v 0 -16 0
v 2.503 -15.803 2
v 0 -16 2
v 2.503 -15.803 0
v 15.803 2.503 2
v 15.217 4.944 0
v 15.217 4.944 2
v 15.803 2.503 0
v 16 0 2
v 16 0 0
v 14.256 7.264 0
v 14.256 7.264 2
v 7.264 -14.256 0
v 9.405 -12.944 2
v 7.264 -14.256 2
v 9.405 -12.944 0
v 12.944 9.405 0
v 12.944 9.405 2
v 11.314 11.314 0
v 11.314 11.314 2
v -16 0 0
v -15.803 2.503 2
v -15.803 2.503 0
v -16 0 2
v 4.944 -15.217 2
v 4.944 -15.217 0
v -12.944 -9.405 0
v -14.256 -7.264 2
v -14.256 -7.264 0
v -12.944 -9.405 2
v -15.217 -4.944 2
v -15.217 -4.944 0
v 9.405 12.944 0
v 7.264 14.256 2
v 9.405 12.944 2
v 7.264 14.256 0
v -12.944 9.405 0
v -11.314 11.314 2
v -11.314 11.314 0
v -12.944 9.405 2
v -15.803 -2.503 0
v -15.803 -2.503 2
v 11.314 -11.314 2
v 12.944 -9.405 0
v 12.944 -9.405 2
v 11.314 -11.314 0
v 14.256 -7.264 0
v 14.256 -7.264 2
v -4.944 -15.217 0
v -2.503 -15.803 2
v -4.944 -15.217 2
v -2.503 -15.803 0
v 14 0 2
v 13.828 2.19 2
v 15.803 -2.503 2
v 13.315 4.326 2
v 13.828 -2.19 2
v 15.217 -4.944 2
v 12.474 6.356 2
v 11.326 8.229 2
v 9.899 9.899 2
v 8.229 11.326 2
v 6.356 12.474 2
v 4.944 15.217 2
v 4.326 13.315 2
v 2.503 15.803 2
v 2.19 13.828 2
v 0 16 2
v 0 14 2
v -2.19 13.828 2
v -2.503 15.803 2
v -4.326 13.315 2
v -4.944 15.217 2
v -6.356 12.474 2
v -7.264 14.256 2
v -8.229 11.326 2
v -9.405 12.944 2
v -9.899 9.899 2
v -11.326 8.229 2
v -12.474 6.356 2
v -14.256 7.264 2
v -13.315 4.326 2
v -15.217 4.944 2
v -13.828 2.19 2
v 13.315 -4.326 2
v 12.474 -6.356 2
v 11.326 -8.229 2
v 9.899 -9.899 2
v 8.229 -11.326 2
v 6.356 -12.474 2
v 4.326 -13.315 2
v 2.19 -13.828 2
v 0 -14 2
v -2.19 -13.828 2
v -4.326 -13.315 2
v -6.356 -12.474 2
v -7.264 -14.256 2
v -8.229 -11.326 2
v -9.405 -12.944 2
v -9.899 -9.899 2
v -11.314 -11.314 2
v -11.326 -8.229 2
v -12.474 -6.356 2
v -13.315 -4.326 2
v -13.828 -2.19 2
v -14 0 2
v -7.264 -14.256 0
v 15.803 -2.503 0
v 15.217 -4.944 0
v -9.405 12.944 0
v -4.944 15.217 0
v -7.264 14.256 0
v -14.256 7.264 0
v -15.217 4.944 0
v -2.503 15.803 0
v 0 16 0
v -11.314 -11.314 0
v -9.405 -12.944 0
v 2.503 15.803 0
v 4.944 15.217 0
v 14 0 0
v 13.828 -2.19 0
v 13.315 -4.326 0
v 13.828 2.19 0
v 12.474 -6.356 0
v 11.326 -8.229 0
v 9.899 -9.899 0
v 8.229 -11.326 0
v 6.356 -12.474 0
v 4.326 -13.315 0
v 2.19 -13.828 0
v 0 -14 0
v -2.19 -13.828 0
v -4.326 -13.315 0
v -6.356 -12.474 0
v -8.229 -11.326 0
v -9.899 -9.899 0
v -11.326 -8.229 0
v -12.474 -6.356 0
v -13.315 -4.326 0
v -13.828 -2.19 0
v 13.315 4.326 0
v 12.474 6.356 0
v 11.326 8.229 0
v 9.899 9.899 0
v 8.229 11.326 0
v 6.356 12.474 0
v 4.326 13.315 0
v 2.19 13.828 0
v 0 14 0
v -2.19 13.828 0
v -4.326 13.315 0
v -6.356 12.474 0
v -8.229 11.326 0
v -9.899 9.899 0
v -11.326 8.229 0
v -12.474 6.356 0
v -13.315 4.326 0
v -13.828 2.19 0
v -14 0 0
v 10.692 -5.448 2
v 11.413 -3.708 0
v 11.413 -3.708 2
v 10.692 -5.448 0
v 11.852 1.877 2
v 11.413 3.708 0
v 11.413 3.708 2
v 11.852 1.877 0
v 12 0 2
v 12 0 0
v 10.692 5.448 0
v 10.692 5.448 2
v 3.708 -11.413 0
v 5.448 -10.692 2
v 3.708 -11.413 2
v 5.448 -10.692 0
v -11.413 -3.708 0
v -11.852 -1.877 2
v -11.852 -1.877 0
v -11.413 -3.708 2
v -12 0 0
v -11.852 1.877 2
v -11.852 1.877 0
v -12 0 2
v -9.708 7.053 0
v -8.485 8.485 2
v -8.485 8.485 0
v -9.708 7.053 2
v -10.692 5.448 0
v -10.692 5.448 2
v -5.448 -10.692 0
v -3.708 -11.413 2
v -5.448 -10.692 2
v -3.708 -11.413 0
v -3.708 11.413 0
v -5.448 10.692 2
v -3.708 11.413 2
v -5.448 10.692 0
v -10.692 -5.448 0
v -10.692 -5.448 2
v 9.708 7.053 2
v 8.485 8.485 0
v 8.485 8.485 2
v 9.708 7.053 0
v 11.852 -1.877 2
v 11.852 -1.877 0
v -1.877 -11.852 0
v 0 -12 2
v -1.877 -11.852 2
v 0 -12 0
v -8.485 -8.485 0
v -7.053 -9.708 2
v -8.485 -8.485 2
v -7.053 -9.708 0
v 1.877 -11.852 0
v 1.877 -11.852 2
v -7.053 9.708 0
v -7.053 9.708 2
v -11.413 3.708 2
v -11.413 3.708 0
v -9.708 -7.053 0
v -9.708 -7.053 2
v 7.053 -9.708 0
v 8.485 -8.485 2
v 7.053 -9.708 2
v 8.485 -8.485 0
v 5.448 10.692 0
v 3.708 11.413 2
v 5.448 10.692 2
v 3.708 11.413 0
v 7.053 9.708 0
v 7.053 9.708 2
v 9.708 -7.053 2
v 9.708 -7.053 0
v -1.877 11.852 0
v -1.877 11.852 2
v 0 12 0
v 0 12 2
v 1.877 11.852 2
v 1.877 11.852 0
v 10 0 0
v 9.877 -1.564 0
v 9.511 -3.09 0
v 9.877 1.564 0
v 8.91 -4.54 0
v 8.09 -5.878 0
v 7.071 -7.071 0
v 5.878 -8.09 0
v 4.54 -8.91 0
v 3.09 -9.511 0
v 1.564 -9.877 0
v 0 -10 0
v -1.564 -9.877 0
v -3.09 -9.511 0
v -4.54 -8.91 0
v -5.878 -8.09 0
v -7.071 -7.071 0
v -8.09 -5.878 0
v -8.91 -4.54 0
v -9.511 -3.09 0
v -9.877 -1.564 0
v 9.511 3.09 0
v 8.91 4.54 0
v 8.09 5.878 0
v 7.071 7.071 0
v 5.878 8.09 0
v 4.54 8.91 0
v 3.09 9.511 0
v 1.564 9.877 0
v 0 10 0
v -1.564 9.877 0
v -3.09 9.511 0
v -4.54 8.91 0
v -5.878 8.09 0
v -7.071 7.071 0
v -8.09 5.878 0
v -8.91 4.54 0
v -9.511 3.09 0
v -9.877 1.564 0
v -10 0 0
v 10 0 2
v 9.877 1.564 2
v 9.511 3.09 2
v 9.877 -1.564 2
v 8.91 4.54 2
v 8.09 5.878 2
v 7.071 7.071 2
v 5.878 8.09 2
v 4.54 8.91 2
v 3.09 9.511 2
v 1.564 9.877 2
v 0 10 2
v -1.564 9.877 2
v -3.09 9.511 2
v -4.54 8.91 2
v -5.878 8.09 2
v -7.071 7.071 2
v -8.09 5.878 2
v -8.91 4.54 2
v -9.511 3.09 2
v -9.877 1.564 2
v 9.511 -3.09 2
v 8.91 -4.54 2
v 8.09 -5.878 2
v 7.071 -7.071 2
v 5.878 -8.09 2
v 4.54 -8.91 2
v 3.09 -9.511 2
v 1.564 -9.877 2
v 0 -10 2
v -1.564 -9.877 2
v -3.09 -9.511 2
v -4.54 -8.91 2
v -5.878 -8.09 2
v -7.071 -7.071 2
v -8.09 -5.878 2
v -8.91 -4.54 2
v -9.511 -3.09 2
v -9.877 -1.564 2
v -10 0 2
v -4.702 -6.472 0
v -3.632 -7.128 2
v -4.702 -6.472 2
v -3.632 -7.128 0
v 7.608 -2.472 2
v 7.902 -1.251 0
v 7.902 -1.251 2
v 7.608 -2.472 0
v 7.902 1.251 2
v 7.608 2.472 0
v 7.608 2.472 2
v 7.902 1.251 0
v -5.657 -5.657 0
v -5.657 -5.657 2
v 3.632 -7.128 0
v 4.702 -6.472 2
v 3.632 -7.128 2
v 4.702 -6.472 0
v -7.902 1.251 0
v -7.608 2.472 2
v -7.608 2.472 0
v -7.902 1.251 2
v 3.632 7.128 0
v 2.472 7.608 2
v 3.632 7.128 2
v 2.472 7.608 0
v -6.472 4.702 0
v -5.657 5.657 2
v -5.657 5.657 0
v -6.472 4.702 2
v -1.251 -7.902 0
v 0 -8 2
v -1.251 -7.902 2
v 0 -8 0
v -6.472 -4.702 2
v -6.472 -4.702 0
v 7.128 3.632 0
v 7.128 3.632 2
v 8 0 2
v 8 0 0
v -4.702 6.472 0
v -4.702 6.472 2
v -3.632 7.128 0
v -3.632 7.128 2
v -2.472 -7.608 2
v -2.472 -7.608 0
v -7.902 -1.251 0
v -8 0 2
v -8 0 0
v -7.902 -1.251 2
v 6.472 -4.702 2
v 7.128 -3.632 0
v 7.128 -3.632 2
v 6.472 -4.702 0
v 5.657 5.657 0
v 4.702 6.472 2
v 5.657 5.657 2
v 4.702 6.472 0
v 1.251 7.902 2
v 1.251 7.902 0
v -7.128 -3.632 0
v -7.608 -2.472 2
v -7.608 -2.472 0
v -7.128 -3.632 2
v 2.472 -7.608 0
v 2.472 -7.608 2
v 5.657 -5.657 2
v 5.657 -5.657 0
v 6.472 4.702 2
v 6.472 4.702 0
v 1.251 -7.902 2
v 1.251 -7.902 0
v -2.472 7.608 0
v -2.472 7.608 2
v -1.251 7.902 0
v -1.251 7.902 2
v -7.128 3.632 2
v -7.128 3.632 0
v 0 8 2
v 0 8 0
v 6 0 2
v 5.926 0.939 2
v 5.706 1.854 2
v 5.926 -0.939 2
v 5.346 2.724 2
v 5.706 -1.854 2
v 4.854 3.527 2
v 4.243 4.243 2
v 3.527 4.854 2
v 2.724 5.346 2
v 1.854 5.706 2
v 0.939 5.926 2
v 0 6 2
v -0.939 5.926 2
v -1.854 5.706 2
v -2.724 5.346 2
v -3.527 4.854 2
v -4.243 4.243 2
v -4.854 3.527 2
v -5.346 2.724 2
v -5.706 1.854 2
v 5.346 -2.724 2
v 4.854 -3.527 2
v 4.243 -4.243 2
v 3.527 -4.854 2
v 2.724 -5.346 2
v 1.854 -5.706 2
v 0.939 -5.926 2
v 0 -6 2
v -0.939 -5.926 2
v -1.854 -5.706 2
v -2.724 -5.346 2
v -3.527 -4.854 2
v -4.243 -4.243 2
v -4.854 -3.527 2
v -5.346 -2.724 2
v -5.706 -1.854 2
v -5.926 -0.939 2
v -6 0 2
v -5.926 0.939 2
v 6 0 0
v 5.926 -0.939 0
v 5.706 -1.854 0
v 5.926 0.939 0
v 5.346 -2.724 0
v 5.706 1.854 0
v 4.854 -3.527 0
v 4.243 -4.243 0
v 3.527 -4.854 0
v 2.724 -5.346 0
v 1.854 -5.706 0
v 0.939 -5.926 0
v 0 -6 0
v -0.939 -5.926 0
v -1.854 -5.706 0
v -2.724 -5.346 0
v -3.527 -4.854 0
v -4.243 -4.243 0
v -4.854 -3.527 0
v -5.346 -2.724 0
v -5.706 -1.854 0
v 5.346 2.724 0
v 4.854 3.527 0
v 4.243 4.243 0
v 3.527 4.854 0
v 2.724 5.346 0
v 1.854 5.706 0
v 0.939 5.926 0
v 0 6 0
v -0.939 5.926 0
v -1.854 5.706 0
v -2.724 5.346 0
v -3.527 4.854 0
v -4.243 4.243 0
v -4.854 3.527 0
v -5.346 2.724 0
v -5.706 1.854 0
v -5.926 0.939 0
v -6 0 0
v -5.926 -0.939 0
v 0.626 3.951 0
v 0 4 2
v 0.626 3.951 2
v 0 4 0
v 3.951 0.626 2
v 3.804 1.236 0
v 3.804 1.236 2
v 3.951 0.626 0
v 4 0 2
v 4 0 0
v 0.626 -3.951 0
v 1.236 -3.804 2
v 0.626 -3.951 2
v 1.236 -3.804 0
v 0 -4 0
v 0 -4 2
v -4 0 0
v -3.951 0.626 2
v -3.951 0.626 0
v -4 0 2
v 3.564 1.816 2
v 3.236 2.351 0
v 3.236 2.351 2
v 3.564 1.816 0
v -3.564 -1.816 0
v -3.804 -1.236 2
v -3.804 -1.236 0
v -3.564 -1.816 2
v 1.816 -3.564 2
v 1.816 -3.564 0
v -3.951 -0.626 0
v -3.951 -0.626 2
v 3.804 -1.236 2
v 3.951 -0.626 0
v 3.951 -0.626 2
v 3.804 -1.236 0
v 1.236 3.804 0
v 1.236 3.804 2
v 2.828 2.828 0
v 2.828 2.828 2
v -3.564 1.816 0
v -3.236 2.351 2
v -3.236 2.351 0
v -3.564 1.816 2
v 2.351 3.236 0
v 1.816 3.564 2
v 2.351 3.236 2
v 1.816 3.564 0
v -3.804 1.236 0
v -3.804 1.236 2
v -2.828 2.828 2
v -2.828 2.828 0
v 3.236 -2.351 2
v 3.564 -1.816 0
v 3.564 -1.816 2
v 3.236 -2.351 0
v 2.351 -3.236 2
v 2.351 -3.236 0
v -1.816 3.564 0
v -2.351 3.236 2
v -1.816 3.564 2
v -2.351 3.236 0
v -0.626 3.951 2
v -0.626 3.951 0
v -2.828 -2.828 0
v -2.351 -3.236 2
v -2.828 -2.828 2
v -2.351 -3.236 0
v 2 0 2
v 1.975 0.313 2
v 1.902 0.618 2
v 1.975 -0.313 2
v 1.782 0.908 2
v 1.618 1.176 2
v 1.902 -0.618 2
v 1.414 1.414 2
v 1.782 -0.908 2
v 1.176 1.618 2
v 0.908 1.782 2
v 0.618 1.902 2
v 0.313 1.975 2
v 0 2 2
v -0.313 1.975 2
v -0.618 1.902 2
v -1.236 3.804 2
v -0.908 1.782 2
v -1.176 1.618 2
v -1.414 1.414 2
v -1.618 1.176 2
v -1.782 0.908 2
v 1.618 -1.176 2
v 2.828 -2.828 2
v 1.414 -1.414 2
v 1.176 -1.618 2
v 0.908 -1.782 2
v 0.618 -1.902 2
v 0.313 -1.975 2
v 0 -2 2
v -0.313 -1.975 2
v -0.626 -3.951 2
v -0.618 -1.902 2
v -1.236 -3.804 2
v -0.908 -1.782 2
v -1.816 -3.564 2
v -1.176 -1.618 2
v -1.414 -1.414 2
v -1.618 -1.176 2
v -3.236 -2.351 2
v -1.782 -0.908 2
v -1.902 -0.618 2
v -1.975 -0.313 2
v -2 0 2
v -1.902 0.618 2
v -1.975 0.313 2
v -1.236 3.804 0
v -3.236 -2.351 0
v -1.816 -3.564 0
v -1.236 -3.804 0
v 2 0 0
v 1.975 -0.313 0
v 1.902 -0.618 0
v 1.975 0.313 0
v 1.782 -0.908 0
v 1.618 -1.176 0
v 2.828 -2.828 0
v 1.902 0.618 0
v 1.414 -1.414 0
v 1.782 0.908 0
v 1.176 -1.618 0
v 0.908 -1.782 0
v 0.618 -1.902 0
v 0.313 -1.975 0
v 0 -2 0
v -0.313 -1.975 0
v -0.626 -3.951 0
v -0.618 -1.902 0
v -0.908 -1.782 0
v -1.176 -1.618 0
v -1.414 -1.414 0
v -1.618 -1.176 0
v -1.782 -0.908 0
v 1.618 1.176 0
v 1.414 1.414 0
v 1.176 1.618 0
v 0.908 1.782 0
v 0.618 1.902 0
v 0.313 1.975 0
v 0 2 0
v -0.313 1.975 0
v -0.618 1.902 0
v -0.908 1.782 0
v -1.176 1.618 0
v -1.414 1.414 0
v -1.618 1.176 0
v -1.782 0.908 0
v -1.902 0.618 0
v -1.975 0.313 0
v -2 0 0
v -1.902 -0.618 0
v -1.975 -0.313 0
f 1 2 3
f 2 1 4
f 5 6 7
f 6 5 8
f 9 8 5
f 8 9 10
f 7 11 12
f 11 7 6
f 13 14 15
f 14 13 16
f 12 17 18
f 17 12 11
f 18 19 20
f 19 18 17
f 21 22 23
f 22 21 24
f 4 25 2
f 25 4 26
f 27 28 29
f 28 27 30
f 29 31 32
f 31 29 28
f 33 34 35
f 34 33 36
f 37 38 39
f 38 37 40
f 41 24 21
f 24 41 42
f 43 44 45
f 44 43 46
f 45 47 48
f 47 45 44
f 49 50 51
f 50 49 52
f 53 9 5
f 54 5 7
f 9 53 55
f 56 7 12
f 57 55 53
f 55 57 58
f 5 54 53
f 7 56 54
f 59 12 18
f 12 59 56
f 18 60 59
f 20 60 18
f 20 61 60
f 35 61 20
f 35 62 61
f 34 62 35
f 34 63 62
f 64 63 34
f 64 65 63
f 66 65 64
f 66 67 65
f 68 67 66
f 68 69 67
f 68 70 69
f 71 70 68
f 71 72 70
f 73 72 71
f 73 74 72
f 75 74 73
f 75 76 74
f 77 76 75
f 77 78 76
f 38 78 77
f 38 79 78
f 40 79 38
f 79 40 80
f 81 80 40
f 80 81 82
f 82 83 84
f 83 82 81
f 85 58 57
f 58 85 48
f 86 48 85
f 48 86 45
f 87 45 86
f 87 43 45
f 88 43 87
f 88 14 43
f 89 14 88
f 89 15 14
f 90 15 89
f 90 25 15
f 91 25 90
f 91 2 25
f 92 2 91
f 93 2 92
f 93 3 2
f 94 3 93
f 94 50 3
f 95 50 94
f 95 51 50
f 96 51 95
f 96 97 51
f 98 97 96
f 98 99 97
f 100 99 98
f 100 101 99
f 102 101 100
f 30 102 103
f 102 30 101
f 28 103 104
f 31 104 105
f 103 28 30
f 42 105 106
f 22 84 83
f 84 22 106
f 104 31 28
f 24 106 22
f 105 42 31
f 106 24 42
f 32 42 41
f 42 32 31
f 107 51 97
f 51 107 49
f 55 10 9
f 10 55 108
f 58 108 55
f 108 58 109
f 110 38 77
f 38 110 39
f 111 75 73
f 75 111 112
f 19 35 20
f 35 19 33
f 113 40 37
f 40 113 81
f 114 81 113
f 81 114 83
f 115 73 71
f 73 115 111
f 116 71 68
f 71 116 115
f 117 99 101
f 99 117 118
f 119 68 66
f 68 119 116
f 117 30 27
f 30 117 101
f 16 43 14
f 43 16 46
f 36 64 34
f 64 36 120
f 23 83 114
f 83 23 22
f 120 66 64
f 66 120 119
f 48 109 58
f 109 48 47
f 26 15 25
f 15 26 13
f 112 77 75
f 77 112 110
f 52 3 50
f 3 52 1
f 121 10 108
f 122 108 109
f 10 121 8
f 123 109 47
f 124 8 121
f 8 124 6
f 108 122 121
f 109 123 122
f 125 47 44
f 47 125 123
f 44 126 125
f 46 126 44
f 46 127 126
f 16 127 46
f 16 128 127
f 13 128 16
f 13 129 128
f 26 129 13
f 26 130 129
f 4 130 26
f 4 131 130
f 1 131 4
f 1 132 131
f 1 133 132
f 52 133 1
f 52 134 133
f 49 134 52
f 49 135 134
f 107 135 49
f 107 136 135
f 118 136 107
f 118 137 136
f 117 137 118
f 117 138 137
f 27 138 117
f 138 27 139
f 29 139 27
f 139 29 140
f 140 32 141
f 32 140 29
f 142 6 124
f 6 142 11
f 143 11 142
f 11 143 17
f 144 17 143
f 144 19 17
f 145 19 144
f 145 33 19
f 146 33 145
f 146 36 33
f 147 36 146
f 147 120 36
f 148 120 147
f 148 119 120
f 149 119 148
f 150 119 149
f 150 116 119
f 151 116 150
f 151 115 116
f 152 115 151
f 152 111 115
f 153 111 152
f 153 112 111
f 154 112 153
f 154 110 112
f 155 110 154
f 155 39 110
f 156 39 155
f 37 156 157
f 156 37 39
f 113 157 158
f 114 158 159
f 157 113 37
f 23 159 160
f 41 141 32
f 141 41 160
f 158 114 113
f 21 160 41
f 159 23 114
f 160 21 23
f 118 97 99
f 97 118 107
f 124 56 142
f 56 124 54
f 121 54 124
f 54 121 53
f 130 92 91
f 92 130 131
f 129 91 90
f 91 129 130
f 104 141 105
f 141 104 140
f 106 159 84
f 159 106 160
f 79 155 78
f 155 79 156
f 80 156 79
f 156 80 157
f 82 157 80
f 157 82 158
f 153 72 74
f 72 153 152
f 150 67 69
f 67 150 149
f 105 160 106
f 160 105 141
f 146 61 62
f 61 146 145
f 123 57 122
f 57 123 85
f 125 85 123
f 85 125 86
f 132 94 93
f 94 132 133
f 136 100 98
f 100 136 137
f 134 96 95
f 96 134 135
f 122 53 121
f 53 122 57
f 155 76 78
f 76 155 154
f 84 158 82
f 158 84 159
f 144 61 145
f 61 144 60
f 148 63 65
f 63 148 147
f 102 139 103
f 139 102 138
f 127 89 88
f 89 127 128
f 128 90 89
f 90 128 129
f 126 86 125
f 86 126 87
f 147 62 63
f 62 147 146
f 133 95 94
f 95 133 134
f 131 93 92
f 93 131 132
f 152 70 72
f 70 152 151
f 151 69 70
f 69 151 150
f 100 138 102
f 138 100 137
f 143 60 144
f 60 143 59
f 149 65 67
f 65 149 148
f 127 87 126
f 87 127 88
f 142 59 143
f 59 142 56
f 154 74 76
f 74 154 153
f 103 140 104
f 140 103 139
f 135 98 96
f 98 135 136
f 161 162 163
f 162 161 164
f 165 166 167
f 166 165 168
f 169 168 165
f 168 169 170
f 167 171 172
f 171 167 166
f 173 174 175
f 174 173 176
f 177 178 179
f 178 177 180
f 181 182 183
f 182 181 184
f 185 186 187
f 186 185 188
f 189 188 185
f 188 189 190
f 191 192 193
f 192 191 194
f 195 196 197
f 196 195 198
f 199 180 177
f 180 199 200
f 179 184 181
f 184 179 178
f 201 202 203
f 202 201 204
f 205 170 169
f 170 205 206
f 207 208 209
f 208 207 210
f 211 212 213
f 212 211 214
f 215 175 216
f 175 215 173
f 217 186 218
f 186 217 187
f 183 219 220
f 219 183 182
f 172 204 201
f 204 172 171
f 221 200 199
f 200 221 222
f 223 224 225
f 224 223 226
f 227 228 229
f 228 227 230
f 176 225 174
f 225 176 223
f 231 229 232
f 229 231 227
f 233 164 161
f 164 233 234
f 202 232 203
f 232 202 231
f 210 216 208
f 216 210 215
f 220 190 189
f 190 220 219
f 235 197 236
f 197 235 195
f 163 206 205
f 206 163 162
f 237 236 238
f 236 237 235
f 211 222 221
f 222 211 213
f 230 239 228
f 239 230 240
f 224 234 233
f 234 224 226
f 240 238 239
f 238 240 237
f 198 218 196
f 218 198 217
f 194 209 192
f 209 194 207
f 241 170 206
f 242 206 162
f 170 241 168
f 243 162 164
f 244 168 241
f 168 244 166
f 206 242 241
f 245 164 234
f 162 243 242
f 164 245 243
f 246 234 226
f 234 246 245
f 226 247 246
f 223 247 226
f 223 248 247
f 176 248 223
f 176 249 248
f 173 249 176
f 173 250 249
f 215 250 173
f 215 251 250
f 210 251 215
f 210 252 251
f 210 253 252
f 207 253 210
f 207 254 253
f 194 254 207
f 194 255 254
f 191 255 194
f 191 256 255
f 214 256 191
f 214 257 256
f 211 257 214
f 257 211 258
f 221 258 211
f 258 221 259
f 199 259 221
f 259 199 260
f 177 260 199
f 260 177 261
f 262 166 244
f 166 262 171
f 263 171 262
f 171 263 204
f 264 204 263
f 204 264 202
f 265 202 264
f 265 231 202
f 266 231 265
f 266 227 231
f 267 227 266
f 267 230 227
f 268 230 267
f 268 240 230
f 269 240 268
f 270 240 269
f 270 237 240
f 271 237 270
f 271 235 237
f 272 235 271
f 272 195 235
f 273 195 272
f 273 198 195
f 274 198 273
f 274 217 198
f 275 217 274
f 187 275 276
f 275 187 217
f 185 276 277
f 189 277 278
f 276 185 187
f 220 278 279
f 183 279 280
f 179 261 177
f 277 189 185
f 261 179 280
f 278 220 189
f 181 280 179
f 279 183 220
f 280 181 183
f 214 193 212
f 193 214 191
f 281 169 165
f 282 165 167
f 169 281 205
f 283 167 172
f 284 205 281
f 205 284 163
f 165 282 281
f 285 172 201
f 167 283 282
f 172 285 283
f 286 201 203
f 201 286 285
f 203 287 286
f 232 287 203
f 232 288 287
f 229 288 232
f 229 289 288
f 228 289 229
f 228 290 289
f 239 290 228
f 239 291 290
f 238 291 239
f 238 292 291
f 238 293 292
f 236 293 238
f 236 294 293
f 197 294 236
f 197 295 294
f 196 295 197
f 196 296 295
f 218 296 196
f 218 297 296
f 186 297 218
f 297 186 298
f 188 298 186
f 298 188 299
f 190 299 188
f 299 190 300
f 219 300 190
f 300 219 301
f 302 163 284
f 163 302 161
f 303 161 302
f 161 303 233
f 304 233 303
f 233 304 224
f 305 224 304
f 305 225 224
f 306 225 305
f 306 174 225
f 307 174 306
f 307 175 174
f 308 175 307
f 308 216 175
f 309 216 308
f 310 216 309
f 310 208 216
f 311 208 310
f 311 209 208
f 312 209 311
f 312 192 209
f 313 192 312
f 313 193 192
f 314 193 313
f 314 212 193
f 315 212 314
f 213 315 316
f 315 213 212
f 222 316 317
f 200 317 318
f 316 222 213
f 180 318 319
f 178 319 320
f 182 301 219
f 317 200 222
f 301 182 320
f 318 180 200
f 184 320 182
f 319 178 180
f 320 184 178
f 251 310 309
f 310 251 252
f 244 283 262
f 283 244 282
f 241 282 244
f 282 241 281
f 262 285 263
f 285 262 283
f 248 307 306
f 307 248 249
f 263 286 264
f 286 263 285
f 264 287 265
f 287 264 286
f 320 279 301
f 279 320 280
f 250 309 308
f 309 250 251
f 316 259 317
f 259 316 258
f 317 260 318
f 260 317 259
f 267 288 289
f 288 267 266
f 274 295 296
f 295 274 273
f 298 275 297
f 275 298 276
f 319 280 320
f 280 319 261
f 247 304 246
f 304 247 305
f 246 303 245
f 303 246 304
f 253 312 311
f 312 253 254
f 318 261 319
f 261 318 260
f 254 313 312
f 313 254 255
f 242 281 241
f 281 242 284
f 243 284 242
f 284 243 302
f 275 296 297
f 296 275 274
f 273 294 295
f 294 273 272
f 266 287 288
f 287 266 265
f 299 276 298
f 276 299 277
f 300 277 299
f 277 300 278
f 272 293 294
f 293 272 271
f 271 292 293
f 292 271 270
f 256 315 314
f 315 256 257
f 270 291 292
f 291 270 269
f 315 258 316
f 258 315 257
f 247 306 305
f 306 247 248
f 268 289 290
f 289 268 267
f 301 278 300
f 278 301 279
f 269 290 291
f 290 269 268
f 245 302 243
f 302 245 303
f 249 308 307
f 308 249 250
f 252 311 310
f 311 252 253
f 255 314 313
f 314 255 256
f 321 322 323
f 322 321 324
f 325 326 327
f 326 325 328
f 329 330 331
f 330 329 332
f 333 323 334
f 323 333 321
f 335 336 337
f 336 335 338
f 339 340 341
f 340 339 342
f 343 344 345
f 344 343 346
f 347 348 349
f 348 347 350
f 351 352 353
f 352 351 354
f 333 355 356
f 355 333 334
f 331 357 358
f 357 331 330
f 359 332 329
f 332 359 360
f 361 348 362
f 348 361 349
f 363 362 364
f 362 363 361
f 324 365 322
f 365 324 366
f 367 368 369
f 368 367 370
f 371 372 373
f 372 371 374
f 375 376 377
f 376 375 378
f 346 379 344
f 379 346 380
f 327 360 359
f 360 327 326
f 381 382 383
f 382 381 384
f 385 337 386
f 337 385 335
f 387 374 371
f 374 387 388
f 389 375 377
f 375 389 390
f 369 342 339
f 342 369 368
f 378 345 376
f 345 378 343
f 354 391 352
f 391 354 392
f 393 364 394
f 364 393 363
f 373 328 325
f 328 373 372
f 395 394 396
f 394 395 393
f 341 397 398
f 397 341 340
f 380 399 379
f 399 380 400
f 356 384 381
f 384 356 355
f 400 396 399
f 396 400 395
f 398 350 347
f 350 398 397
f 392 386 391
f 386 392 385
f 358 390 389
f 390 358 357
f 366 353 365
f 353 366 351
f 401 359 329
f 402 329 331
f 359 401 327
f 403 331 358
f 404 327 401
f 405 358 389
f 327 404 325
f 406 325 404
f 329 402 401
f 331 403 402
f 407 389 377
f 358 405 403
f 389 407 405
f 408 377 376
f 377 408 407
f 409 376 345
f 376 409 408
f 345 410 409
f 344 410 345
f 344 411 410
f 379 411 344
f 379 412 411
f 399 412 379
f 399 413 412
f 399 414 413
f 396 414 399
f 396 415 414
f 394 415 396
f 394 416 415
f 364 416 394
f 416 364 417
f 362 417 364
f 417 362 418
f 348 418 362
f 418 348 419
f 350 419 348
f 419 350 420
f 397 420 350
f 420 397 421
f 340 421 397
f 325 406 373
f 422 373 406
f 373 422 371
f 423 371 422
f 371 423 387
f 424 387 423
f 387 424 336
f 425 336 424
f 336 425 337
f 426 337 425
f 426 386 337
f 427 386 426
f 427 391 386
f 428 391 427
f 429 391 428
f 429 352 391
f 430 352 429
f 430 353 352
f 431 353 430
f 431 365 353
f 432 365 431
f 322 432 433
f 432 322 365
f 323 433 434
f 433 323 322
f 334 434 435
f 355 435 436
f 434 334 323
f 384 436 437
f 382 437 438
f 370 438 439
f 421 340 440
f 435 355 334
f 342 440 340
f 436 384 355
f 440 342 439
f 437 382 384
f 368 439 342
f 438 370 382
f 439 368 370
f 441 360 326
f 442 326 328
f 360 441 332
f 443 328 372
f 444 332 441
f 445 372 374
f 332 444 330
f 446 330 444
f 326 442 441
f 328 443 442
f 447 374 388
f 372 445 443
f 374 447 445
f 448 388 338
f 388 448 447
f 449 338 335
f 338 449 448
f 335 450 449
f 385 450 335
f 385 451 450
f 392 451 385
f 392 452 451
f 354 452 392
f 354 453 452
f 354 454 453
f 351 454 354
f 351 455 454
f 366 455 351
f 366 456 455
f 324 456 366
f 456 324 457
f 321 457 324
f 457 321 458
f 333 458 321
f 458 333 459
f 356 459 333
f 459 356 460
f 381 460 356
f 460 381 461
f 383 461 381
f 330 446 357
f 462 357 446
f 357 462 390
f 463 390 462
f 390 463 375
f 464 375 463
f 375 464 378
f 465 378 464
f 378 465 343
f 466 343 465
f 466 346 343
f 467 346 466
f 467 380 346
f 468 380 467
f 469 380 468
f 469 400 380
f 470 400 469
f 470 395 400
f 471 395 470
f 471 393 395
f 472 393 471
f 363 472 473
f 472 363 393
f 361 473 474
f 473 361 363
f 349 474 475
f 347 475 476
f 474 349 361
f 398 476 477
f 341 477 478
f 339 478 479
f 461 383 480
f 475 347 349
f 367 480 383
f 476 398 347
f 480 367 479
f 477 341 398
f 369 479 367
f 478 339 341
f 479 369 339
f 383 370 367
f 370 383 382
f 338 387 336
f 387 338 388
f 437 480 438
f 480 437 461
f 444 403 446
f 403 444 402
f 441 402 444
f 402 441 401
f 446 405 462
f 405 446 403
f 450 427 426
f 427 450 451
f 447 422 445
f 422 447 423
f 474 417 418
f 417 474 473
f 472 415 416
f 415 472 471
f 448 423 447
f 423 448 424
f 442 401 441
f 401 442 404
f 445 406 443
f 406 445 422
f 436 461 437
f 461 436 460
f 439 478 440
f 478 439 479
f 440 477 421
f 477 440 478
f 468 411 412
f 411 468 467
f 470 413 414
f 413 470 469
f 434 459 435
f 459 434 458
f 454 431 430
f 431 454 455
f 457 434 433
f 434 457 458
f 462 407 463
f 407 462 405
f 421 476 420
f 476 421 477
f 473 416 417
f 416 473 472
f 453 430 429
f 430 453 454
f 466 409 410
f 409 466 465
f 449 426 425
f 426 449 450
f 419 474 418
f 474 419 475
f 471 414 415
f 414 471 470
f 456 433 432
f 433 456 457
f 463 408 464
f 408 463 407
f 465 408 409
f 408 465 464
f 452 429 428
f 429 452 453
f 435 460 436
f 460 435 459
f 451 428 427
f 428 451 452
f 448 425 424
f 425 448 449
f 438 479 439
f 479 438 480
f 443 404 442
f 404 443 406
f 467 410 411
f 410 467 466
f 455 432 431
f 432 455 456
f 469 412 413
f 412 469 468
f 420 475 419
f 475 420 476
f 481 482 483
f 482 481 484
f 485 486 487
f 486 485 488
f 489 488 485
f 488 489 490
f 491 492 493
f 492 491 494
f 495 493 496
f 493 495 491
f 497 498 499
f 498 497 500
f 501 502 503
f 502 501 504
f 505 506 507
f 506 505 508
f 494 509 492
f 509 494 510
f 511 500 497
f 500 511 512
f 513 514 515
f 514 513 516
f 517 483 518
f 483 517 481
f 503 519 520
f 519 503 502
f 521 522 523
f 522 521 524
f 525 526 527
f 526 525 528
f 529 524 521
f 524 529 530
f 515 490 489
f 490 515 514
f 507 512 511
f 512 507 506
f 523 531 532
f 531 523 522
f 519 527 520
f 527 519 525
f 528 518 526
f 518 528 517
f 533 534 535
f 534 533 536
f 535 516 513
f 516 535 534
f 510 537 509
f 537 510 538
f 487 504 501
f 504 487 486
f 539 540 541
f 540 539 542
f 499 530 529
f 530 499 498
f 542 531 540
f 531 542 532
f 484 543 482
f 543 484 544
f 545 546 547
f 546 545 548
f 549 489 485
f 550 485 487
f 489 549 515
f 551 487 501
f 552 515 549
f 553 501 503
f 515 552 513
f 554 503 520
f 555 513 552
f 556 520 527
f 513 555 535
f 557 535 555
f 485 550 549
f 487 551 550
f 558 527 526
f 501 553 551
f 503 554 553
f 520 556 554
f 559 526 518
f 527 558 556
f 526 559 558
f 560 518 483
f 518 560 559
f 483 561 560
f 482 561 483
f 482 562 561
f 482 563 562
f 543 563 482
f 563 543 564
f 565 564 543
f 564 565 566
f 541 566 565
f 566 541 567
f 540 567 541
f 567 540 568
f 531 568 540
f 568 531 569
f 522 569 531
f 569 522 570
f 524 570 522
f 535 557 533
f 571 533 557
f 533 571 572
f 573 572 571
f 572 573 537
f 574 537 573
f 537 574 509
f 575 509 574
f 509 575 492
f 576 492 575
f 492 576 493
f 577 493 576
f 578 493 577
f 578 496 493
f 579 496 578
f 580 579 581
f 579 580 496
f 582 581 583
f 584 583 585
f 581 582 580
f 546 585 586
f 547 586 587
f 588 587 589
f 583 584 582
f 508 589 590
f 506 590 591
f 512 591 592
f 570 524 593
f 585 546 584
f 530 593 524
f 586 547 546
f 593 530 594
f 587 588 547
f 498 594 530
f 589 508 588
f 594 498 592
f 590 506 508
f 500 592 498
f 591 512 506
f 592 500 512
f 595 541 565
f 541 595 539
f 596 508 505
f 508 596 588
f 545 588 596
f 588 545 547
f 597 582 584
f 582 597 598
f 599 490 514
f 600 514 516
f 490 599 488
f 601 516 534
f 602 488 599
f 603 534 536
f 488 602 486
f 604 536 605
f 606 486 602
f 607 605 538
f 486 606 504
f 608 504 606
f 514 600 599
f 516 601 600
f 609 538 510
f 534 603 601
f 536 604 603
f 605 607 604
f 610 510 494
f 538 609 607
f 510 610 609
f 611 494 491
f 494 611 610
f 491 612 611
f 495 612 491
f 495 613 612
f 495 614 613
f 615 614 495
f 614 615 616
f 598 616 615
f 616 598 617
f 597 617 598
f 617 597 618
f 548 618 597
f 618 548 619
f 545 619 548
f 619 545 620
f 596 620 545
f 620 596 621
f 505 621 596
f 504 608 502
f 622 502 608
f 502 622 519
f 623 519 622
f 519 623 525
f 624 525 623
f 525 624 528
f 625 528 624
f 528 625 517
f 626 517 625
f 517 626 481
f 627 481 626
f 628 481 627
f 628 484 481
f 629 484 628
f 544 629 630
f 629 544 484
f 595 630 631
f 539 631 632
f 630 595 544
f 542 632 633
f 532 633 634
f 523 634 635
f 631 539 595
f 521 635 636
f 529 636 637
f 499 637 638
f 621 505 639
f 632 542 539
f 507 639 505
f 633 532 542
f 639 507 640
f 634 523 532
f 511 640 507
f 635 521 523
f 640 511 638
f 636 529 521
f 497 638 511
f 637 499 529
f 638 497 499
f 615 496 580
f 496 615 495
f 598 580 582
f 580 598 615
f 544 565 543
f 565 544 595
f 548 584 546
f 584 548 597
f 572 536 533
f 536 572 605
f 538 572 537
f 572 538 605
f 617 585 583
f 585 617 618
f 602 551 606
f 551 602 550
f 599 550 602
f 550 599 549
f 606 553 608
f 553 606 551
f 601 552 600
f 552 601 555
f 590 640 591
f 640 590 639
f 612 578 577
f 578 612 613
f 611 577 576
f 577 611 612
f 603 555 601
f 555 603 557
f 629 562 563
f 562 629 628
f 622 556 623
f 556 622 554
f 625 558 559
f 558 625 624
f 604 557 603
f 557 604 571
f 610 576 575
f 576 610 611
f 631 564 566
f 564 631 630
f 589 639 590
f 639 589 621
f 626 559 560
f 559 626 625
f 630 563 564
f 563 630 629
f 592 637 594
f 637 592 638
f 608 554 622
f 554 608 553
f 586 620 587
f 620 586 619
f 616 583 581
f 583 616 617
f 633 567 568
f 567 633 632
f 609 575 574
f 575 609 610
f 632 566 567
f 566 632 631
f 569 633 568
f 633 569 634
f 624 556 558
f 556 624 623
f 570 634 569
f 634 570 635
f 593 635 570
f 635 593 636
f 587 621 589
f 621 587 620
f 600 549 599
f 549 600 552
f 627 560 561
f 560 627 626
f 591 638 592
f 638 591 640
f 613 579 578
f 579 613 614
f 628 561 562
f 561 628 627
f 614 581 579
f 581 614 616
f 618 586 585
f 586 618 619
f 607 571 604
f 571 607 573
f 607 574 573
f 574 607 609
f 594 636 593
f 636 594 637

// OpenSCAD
$fa=9;
$fs=0.1;

scale_1in=25.4;

module donut_test(
	irad=9.0
	, orad=11.0
	, height=2.0
	) {
  difference() {
    cylinder(r=orad,h=height,center=false);
    translate([0,0,-0.005*height]) 
	cylinder(r=irad,h=height+0.01*height,center=false);
  }
}

donut_test(irad=14,orad=16,height=2);

donut_test(irad=10,orad=12,height=2);

donut_test(irad=6,orad=8,height=2);

donut_test(irad=2,orad=4,height=2);
